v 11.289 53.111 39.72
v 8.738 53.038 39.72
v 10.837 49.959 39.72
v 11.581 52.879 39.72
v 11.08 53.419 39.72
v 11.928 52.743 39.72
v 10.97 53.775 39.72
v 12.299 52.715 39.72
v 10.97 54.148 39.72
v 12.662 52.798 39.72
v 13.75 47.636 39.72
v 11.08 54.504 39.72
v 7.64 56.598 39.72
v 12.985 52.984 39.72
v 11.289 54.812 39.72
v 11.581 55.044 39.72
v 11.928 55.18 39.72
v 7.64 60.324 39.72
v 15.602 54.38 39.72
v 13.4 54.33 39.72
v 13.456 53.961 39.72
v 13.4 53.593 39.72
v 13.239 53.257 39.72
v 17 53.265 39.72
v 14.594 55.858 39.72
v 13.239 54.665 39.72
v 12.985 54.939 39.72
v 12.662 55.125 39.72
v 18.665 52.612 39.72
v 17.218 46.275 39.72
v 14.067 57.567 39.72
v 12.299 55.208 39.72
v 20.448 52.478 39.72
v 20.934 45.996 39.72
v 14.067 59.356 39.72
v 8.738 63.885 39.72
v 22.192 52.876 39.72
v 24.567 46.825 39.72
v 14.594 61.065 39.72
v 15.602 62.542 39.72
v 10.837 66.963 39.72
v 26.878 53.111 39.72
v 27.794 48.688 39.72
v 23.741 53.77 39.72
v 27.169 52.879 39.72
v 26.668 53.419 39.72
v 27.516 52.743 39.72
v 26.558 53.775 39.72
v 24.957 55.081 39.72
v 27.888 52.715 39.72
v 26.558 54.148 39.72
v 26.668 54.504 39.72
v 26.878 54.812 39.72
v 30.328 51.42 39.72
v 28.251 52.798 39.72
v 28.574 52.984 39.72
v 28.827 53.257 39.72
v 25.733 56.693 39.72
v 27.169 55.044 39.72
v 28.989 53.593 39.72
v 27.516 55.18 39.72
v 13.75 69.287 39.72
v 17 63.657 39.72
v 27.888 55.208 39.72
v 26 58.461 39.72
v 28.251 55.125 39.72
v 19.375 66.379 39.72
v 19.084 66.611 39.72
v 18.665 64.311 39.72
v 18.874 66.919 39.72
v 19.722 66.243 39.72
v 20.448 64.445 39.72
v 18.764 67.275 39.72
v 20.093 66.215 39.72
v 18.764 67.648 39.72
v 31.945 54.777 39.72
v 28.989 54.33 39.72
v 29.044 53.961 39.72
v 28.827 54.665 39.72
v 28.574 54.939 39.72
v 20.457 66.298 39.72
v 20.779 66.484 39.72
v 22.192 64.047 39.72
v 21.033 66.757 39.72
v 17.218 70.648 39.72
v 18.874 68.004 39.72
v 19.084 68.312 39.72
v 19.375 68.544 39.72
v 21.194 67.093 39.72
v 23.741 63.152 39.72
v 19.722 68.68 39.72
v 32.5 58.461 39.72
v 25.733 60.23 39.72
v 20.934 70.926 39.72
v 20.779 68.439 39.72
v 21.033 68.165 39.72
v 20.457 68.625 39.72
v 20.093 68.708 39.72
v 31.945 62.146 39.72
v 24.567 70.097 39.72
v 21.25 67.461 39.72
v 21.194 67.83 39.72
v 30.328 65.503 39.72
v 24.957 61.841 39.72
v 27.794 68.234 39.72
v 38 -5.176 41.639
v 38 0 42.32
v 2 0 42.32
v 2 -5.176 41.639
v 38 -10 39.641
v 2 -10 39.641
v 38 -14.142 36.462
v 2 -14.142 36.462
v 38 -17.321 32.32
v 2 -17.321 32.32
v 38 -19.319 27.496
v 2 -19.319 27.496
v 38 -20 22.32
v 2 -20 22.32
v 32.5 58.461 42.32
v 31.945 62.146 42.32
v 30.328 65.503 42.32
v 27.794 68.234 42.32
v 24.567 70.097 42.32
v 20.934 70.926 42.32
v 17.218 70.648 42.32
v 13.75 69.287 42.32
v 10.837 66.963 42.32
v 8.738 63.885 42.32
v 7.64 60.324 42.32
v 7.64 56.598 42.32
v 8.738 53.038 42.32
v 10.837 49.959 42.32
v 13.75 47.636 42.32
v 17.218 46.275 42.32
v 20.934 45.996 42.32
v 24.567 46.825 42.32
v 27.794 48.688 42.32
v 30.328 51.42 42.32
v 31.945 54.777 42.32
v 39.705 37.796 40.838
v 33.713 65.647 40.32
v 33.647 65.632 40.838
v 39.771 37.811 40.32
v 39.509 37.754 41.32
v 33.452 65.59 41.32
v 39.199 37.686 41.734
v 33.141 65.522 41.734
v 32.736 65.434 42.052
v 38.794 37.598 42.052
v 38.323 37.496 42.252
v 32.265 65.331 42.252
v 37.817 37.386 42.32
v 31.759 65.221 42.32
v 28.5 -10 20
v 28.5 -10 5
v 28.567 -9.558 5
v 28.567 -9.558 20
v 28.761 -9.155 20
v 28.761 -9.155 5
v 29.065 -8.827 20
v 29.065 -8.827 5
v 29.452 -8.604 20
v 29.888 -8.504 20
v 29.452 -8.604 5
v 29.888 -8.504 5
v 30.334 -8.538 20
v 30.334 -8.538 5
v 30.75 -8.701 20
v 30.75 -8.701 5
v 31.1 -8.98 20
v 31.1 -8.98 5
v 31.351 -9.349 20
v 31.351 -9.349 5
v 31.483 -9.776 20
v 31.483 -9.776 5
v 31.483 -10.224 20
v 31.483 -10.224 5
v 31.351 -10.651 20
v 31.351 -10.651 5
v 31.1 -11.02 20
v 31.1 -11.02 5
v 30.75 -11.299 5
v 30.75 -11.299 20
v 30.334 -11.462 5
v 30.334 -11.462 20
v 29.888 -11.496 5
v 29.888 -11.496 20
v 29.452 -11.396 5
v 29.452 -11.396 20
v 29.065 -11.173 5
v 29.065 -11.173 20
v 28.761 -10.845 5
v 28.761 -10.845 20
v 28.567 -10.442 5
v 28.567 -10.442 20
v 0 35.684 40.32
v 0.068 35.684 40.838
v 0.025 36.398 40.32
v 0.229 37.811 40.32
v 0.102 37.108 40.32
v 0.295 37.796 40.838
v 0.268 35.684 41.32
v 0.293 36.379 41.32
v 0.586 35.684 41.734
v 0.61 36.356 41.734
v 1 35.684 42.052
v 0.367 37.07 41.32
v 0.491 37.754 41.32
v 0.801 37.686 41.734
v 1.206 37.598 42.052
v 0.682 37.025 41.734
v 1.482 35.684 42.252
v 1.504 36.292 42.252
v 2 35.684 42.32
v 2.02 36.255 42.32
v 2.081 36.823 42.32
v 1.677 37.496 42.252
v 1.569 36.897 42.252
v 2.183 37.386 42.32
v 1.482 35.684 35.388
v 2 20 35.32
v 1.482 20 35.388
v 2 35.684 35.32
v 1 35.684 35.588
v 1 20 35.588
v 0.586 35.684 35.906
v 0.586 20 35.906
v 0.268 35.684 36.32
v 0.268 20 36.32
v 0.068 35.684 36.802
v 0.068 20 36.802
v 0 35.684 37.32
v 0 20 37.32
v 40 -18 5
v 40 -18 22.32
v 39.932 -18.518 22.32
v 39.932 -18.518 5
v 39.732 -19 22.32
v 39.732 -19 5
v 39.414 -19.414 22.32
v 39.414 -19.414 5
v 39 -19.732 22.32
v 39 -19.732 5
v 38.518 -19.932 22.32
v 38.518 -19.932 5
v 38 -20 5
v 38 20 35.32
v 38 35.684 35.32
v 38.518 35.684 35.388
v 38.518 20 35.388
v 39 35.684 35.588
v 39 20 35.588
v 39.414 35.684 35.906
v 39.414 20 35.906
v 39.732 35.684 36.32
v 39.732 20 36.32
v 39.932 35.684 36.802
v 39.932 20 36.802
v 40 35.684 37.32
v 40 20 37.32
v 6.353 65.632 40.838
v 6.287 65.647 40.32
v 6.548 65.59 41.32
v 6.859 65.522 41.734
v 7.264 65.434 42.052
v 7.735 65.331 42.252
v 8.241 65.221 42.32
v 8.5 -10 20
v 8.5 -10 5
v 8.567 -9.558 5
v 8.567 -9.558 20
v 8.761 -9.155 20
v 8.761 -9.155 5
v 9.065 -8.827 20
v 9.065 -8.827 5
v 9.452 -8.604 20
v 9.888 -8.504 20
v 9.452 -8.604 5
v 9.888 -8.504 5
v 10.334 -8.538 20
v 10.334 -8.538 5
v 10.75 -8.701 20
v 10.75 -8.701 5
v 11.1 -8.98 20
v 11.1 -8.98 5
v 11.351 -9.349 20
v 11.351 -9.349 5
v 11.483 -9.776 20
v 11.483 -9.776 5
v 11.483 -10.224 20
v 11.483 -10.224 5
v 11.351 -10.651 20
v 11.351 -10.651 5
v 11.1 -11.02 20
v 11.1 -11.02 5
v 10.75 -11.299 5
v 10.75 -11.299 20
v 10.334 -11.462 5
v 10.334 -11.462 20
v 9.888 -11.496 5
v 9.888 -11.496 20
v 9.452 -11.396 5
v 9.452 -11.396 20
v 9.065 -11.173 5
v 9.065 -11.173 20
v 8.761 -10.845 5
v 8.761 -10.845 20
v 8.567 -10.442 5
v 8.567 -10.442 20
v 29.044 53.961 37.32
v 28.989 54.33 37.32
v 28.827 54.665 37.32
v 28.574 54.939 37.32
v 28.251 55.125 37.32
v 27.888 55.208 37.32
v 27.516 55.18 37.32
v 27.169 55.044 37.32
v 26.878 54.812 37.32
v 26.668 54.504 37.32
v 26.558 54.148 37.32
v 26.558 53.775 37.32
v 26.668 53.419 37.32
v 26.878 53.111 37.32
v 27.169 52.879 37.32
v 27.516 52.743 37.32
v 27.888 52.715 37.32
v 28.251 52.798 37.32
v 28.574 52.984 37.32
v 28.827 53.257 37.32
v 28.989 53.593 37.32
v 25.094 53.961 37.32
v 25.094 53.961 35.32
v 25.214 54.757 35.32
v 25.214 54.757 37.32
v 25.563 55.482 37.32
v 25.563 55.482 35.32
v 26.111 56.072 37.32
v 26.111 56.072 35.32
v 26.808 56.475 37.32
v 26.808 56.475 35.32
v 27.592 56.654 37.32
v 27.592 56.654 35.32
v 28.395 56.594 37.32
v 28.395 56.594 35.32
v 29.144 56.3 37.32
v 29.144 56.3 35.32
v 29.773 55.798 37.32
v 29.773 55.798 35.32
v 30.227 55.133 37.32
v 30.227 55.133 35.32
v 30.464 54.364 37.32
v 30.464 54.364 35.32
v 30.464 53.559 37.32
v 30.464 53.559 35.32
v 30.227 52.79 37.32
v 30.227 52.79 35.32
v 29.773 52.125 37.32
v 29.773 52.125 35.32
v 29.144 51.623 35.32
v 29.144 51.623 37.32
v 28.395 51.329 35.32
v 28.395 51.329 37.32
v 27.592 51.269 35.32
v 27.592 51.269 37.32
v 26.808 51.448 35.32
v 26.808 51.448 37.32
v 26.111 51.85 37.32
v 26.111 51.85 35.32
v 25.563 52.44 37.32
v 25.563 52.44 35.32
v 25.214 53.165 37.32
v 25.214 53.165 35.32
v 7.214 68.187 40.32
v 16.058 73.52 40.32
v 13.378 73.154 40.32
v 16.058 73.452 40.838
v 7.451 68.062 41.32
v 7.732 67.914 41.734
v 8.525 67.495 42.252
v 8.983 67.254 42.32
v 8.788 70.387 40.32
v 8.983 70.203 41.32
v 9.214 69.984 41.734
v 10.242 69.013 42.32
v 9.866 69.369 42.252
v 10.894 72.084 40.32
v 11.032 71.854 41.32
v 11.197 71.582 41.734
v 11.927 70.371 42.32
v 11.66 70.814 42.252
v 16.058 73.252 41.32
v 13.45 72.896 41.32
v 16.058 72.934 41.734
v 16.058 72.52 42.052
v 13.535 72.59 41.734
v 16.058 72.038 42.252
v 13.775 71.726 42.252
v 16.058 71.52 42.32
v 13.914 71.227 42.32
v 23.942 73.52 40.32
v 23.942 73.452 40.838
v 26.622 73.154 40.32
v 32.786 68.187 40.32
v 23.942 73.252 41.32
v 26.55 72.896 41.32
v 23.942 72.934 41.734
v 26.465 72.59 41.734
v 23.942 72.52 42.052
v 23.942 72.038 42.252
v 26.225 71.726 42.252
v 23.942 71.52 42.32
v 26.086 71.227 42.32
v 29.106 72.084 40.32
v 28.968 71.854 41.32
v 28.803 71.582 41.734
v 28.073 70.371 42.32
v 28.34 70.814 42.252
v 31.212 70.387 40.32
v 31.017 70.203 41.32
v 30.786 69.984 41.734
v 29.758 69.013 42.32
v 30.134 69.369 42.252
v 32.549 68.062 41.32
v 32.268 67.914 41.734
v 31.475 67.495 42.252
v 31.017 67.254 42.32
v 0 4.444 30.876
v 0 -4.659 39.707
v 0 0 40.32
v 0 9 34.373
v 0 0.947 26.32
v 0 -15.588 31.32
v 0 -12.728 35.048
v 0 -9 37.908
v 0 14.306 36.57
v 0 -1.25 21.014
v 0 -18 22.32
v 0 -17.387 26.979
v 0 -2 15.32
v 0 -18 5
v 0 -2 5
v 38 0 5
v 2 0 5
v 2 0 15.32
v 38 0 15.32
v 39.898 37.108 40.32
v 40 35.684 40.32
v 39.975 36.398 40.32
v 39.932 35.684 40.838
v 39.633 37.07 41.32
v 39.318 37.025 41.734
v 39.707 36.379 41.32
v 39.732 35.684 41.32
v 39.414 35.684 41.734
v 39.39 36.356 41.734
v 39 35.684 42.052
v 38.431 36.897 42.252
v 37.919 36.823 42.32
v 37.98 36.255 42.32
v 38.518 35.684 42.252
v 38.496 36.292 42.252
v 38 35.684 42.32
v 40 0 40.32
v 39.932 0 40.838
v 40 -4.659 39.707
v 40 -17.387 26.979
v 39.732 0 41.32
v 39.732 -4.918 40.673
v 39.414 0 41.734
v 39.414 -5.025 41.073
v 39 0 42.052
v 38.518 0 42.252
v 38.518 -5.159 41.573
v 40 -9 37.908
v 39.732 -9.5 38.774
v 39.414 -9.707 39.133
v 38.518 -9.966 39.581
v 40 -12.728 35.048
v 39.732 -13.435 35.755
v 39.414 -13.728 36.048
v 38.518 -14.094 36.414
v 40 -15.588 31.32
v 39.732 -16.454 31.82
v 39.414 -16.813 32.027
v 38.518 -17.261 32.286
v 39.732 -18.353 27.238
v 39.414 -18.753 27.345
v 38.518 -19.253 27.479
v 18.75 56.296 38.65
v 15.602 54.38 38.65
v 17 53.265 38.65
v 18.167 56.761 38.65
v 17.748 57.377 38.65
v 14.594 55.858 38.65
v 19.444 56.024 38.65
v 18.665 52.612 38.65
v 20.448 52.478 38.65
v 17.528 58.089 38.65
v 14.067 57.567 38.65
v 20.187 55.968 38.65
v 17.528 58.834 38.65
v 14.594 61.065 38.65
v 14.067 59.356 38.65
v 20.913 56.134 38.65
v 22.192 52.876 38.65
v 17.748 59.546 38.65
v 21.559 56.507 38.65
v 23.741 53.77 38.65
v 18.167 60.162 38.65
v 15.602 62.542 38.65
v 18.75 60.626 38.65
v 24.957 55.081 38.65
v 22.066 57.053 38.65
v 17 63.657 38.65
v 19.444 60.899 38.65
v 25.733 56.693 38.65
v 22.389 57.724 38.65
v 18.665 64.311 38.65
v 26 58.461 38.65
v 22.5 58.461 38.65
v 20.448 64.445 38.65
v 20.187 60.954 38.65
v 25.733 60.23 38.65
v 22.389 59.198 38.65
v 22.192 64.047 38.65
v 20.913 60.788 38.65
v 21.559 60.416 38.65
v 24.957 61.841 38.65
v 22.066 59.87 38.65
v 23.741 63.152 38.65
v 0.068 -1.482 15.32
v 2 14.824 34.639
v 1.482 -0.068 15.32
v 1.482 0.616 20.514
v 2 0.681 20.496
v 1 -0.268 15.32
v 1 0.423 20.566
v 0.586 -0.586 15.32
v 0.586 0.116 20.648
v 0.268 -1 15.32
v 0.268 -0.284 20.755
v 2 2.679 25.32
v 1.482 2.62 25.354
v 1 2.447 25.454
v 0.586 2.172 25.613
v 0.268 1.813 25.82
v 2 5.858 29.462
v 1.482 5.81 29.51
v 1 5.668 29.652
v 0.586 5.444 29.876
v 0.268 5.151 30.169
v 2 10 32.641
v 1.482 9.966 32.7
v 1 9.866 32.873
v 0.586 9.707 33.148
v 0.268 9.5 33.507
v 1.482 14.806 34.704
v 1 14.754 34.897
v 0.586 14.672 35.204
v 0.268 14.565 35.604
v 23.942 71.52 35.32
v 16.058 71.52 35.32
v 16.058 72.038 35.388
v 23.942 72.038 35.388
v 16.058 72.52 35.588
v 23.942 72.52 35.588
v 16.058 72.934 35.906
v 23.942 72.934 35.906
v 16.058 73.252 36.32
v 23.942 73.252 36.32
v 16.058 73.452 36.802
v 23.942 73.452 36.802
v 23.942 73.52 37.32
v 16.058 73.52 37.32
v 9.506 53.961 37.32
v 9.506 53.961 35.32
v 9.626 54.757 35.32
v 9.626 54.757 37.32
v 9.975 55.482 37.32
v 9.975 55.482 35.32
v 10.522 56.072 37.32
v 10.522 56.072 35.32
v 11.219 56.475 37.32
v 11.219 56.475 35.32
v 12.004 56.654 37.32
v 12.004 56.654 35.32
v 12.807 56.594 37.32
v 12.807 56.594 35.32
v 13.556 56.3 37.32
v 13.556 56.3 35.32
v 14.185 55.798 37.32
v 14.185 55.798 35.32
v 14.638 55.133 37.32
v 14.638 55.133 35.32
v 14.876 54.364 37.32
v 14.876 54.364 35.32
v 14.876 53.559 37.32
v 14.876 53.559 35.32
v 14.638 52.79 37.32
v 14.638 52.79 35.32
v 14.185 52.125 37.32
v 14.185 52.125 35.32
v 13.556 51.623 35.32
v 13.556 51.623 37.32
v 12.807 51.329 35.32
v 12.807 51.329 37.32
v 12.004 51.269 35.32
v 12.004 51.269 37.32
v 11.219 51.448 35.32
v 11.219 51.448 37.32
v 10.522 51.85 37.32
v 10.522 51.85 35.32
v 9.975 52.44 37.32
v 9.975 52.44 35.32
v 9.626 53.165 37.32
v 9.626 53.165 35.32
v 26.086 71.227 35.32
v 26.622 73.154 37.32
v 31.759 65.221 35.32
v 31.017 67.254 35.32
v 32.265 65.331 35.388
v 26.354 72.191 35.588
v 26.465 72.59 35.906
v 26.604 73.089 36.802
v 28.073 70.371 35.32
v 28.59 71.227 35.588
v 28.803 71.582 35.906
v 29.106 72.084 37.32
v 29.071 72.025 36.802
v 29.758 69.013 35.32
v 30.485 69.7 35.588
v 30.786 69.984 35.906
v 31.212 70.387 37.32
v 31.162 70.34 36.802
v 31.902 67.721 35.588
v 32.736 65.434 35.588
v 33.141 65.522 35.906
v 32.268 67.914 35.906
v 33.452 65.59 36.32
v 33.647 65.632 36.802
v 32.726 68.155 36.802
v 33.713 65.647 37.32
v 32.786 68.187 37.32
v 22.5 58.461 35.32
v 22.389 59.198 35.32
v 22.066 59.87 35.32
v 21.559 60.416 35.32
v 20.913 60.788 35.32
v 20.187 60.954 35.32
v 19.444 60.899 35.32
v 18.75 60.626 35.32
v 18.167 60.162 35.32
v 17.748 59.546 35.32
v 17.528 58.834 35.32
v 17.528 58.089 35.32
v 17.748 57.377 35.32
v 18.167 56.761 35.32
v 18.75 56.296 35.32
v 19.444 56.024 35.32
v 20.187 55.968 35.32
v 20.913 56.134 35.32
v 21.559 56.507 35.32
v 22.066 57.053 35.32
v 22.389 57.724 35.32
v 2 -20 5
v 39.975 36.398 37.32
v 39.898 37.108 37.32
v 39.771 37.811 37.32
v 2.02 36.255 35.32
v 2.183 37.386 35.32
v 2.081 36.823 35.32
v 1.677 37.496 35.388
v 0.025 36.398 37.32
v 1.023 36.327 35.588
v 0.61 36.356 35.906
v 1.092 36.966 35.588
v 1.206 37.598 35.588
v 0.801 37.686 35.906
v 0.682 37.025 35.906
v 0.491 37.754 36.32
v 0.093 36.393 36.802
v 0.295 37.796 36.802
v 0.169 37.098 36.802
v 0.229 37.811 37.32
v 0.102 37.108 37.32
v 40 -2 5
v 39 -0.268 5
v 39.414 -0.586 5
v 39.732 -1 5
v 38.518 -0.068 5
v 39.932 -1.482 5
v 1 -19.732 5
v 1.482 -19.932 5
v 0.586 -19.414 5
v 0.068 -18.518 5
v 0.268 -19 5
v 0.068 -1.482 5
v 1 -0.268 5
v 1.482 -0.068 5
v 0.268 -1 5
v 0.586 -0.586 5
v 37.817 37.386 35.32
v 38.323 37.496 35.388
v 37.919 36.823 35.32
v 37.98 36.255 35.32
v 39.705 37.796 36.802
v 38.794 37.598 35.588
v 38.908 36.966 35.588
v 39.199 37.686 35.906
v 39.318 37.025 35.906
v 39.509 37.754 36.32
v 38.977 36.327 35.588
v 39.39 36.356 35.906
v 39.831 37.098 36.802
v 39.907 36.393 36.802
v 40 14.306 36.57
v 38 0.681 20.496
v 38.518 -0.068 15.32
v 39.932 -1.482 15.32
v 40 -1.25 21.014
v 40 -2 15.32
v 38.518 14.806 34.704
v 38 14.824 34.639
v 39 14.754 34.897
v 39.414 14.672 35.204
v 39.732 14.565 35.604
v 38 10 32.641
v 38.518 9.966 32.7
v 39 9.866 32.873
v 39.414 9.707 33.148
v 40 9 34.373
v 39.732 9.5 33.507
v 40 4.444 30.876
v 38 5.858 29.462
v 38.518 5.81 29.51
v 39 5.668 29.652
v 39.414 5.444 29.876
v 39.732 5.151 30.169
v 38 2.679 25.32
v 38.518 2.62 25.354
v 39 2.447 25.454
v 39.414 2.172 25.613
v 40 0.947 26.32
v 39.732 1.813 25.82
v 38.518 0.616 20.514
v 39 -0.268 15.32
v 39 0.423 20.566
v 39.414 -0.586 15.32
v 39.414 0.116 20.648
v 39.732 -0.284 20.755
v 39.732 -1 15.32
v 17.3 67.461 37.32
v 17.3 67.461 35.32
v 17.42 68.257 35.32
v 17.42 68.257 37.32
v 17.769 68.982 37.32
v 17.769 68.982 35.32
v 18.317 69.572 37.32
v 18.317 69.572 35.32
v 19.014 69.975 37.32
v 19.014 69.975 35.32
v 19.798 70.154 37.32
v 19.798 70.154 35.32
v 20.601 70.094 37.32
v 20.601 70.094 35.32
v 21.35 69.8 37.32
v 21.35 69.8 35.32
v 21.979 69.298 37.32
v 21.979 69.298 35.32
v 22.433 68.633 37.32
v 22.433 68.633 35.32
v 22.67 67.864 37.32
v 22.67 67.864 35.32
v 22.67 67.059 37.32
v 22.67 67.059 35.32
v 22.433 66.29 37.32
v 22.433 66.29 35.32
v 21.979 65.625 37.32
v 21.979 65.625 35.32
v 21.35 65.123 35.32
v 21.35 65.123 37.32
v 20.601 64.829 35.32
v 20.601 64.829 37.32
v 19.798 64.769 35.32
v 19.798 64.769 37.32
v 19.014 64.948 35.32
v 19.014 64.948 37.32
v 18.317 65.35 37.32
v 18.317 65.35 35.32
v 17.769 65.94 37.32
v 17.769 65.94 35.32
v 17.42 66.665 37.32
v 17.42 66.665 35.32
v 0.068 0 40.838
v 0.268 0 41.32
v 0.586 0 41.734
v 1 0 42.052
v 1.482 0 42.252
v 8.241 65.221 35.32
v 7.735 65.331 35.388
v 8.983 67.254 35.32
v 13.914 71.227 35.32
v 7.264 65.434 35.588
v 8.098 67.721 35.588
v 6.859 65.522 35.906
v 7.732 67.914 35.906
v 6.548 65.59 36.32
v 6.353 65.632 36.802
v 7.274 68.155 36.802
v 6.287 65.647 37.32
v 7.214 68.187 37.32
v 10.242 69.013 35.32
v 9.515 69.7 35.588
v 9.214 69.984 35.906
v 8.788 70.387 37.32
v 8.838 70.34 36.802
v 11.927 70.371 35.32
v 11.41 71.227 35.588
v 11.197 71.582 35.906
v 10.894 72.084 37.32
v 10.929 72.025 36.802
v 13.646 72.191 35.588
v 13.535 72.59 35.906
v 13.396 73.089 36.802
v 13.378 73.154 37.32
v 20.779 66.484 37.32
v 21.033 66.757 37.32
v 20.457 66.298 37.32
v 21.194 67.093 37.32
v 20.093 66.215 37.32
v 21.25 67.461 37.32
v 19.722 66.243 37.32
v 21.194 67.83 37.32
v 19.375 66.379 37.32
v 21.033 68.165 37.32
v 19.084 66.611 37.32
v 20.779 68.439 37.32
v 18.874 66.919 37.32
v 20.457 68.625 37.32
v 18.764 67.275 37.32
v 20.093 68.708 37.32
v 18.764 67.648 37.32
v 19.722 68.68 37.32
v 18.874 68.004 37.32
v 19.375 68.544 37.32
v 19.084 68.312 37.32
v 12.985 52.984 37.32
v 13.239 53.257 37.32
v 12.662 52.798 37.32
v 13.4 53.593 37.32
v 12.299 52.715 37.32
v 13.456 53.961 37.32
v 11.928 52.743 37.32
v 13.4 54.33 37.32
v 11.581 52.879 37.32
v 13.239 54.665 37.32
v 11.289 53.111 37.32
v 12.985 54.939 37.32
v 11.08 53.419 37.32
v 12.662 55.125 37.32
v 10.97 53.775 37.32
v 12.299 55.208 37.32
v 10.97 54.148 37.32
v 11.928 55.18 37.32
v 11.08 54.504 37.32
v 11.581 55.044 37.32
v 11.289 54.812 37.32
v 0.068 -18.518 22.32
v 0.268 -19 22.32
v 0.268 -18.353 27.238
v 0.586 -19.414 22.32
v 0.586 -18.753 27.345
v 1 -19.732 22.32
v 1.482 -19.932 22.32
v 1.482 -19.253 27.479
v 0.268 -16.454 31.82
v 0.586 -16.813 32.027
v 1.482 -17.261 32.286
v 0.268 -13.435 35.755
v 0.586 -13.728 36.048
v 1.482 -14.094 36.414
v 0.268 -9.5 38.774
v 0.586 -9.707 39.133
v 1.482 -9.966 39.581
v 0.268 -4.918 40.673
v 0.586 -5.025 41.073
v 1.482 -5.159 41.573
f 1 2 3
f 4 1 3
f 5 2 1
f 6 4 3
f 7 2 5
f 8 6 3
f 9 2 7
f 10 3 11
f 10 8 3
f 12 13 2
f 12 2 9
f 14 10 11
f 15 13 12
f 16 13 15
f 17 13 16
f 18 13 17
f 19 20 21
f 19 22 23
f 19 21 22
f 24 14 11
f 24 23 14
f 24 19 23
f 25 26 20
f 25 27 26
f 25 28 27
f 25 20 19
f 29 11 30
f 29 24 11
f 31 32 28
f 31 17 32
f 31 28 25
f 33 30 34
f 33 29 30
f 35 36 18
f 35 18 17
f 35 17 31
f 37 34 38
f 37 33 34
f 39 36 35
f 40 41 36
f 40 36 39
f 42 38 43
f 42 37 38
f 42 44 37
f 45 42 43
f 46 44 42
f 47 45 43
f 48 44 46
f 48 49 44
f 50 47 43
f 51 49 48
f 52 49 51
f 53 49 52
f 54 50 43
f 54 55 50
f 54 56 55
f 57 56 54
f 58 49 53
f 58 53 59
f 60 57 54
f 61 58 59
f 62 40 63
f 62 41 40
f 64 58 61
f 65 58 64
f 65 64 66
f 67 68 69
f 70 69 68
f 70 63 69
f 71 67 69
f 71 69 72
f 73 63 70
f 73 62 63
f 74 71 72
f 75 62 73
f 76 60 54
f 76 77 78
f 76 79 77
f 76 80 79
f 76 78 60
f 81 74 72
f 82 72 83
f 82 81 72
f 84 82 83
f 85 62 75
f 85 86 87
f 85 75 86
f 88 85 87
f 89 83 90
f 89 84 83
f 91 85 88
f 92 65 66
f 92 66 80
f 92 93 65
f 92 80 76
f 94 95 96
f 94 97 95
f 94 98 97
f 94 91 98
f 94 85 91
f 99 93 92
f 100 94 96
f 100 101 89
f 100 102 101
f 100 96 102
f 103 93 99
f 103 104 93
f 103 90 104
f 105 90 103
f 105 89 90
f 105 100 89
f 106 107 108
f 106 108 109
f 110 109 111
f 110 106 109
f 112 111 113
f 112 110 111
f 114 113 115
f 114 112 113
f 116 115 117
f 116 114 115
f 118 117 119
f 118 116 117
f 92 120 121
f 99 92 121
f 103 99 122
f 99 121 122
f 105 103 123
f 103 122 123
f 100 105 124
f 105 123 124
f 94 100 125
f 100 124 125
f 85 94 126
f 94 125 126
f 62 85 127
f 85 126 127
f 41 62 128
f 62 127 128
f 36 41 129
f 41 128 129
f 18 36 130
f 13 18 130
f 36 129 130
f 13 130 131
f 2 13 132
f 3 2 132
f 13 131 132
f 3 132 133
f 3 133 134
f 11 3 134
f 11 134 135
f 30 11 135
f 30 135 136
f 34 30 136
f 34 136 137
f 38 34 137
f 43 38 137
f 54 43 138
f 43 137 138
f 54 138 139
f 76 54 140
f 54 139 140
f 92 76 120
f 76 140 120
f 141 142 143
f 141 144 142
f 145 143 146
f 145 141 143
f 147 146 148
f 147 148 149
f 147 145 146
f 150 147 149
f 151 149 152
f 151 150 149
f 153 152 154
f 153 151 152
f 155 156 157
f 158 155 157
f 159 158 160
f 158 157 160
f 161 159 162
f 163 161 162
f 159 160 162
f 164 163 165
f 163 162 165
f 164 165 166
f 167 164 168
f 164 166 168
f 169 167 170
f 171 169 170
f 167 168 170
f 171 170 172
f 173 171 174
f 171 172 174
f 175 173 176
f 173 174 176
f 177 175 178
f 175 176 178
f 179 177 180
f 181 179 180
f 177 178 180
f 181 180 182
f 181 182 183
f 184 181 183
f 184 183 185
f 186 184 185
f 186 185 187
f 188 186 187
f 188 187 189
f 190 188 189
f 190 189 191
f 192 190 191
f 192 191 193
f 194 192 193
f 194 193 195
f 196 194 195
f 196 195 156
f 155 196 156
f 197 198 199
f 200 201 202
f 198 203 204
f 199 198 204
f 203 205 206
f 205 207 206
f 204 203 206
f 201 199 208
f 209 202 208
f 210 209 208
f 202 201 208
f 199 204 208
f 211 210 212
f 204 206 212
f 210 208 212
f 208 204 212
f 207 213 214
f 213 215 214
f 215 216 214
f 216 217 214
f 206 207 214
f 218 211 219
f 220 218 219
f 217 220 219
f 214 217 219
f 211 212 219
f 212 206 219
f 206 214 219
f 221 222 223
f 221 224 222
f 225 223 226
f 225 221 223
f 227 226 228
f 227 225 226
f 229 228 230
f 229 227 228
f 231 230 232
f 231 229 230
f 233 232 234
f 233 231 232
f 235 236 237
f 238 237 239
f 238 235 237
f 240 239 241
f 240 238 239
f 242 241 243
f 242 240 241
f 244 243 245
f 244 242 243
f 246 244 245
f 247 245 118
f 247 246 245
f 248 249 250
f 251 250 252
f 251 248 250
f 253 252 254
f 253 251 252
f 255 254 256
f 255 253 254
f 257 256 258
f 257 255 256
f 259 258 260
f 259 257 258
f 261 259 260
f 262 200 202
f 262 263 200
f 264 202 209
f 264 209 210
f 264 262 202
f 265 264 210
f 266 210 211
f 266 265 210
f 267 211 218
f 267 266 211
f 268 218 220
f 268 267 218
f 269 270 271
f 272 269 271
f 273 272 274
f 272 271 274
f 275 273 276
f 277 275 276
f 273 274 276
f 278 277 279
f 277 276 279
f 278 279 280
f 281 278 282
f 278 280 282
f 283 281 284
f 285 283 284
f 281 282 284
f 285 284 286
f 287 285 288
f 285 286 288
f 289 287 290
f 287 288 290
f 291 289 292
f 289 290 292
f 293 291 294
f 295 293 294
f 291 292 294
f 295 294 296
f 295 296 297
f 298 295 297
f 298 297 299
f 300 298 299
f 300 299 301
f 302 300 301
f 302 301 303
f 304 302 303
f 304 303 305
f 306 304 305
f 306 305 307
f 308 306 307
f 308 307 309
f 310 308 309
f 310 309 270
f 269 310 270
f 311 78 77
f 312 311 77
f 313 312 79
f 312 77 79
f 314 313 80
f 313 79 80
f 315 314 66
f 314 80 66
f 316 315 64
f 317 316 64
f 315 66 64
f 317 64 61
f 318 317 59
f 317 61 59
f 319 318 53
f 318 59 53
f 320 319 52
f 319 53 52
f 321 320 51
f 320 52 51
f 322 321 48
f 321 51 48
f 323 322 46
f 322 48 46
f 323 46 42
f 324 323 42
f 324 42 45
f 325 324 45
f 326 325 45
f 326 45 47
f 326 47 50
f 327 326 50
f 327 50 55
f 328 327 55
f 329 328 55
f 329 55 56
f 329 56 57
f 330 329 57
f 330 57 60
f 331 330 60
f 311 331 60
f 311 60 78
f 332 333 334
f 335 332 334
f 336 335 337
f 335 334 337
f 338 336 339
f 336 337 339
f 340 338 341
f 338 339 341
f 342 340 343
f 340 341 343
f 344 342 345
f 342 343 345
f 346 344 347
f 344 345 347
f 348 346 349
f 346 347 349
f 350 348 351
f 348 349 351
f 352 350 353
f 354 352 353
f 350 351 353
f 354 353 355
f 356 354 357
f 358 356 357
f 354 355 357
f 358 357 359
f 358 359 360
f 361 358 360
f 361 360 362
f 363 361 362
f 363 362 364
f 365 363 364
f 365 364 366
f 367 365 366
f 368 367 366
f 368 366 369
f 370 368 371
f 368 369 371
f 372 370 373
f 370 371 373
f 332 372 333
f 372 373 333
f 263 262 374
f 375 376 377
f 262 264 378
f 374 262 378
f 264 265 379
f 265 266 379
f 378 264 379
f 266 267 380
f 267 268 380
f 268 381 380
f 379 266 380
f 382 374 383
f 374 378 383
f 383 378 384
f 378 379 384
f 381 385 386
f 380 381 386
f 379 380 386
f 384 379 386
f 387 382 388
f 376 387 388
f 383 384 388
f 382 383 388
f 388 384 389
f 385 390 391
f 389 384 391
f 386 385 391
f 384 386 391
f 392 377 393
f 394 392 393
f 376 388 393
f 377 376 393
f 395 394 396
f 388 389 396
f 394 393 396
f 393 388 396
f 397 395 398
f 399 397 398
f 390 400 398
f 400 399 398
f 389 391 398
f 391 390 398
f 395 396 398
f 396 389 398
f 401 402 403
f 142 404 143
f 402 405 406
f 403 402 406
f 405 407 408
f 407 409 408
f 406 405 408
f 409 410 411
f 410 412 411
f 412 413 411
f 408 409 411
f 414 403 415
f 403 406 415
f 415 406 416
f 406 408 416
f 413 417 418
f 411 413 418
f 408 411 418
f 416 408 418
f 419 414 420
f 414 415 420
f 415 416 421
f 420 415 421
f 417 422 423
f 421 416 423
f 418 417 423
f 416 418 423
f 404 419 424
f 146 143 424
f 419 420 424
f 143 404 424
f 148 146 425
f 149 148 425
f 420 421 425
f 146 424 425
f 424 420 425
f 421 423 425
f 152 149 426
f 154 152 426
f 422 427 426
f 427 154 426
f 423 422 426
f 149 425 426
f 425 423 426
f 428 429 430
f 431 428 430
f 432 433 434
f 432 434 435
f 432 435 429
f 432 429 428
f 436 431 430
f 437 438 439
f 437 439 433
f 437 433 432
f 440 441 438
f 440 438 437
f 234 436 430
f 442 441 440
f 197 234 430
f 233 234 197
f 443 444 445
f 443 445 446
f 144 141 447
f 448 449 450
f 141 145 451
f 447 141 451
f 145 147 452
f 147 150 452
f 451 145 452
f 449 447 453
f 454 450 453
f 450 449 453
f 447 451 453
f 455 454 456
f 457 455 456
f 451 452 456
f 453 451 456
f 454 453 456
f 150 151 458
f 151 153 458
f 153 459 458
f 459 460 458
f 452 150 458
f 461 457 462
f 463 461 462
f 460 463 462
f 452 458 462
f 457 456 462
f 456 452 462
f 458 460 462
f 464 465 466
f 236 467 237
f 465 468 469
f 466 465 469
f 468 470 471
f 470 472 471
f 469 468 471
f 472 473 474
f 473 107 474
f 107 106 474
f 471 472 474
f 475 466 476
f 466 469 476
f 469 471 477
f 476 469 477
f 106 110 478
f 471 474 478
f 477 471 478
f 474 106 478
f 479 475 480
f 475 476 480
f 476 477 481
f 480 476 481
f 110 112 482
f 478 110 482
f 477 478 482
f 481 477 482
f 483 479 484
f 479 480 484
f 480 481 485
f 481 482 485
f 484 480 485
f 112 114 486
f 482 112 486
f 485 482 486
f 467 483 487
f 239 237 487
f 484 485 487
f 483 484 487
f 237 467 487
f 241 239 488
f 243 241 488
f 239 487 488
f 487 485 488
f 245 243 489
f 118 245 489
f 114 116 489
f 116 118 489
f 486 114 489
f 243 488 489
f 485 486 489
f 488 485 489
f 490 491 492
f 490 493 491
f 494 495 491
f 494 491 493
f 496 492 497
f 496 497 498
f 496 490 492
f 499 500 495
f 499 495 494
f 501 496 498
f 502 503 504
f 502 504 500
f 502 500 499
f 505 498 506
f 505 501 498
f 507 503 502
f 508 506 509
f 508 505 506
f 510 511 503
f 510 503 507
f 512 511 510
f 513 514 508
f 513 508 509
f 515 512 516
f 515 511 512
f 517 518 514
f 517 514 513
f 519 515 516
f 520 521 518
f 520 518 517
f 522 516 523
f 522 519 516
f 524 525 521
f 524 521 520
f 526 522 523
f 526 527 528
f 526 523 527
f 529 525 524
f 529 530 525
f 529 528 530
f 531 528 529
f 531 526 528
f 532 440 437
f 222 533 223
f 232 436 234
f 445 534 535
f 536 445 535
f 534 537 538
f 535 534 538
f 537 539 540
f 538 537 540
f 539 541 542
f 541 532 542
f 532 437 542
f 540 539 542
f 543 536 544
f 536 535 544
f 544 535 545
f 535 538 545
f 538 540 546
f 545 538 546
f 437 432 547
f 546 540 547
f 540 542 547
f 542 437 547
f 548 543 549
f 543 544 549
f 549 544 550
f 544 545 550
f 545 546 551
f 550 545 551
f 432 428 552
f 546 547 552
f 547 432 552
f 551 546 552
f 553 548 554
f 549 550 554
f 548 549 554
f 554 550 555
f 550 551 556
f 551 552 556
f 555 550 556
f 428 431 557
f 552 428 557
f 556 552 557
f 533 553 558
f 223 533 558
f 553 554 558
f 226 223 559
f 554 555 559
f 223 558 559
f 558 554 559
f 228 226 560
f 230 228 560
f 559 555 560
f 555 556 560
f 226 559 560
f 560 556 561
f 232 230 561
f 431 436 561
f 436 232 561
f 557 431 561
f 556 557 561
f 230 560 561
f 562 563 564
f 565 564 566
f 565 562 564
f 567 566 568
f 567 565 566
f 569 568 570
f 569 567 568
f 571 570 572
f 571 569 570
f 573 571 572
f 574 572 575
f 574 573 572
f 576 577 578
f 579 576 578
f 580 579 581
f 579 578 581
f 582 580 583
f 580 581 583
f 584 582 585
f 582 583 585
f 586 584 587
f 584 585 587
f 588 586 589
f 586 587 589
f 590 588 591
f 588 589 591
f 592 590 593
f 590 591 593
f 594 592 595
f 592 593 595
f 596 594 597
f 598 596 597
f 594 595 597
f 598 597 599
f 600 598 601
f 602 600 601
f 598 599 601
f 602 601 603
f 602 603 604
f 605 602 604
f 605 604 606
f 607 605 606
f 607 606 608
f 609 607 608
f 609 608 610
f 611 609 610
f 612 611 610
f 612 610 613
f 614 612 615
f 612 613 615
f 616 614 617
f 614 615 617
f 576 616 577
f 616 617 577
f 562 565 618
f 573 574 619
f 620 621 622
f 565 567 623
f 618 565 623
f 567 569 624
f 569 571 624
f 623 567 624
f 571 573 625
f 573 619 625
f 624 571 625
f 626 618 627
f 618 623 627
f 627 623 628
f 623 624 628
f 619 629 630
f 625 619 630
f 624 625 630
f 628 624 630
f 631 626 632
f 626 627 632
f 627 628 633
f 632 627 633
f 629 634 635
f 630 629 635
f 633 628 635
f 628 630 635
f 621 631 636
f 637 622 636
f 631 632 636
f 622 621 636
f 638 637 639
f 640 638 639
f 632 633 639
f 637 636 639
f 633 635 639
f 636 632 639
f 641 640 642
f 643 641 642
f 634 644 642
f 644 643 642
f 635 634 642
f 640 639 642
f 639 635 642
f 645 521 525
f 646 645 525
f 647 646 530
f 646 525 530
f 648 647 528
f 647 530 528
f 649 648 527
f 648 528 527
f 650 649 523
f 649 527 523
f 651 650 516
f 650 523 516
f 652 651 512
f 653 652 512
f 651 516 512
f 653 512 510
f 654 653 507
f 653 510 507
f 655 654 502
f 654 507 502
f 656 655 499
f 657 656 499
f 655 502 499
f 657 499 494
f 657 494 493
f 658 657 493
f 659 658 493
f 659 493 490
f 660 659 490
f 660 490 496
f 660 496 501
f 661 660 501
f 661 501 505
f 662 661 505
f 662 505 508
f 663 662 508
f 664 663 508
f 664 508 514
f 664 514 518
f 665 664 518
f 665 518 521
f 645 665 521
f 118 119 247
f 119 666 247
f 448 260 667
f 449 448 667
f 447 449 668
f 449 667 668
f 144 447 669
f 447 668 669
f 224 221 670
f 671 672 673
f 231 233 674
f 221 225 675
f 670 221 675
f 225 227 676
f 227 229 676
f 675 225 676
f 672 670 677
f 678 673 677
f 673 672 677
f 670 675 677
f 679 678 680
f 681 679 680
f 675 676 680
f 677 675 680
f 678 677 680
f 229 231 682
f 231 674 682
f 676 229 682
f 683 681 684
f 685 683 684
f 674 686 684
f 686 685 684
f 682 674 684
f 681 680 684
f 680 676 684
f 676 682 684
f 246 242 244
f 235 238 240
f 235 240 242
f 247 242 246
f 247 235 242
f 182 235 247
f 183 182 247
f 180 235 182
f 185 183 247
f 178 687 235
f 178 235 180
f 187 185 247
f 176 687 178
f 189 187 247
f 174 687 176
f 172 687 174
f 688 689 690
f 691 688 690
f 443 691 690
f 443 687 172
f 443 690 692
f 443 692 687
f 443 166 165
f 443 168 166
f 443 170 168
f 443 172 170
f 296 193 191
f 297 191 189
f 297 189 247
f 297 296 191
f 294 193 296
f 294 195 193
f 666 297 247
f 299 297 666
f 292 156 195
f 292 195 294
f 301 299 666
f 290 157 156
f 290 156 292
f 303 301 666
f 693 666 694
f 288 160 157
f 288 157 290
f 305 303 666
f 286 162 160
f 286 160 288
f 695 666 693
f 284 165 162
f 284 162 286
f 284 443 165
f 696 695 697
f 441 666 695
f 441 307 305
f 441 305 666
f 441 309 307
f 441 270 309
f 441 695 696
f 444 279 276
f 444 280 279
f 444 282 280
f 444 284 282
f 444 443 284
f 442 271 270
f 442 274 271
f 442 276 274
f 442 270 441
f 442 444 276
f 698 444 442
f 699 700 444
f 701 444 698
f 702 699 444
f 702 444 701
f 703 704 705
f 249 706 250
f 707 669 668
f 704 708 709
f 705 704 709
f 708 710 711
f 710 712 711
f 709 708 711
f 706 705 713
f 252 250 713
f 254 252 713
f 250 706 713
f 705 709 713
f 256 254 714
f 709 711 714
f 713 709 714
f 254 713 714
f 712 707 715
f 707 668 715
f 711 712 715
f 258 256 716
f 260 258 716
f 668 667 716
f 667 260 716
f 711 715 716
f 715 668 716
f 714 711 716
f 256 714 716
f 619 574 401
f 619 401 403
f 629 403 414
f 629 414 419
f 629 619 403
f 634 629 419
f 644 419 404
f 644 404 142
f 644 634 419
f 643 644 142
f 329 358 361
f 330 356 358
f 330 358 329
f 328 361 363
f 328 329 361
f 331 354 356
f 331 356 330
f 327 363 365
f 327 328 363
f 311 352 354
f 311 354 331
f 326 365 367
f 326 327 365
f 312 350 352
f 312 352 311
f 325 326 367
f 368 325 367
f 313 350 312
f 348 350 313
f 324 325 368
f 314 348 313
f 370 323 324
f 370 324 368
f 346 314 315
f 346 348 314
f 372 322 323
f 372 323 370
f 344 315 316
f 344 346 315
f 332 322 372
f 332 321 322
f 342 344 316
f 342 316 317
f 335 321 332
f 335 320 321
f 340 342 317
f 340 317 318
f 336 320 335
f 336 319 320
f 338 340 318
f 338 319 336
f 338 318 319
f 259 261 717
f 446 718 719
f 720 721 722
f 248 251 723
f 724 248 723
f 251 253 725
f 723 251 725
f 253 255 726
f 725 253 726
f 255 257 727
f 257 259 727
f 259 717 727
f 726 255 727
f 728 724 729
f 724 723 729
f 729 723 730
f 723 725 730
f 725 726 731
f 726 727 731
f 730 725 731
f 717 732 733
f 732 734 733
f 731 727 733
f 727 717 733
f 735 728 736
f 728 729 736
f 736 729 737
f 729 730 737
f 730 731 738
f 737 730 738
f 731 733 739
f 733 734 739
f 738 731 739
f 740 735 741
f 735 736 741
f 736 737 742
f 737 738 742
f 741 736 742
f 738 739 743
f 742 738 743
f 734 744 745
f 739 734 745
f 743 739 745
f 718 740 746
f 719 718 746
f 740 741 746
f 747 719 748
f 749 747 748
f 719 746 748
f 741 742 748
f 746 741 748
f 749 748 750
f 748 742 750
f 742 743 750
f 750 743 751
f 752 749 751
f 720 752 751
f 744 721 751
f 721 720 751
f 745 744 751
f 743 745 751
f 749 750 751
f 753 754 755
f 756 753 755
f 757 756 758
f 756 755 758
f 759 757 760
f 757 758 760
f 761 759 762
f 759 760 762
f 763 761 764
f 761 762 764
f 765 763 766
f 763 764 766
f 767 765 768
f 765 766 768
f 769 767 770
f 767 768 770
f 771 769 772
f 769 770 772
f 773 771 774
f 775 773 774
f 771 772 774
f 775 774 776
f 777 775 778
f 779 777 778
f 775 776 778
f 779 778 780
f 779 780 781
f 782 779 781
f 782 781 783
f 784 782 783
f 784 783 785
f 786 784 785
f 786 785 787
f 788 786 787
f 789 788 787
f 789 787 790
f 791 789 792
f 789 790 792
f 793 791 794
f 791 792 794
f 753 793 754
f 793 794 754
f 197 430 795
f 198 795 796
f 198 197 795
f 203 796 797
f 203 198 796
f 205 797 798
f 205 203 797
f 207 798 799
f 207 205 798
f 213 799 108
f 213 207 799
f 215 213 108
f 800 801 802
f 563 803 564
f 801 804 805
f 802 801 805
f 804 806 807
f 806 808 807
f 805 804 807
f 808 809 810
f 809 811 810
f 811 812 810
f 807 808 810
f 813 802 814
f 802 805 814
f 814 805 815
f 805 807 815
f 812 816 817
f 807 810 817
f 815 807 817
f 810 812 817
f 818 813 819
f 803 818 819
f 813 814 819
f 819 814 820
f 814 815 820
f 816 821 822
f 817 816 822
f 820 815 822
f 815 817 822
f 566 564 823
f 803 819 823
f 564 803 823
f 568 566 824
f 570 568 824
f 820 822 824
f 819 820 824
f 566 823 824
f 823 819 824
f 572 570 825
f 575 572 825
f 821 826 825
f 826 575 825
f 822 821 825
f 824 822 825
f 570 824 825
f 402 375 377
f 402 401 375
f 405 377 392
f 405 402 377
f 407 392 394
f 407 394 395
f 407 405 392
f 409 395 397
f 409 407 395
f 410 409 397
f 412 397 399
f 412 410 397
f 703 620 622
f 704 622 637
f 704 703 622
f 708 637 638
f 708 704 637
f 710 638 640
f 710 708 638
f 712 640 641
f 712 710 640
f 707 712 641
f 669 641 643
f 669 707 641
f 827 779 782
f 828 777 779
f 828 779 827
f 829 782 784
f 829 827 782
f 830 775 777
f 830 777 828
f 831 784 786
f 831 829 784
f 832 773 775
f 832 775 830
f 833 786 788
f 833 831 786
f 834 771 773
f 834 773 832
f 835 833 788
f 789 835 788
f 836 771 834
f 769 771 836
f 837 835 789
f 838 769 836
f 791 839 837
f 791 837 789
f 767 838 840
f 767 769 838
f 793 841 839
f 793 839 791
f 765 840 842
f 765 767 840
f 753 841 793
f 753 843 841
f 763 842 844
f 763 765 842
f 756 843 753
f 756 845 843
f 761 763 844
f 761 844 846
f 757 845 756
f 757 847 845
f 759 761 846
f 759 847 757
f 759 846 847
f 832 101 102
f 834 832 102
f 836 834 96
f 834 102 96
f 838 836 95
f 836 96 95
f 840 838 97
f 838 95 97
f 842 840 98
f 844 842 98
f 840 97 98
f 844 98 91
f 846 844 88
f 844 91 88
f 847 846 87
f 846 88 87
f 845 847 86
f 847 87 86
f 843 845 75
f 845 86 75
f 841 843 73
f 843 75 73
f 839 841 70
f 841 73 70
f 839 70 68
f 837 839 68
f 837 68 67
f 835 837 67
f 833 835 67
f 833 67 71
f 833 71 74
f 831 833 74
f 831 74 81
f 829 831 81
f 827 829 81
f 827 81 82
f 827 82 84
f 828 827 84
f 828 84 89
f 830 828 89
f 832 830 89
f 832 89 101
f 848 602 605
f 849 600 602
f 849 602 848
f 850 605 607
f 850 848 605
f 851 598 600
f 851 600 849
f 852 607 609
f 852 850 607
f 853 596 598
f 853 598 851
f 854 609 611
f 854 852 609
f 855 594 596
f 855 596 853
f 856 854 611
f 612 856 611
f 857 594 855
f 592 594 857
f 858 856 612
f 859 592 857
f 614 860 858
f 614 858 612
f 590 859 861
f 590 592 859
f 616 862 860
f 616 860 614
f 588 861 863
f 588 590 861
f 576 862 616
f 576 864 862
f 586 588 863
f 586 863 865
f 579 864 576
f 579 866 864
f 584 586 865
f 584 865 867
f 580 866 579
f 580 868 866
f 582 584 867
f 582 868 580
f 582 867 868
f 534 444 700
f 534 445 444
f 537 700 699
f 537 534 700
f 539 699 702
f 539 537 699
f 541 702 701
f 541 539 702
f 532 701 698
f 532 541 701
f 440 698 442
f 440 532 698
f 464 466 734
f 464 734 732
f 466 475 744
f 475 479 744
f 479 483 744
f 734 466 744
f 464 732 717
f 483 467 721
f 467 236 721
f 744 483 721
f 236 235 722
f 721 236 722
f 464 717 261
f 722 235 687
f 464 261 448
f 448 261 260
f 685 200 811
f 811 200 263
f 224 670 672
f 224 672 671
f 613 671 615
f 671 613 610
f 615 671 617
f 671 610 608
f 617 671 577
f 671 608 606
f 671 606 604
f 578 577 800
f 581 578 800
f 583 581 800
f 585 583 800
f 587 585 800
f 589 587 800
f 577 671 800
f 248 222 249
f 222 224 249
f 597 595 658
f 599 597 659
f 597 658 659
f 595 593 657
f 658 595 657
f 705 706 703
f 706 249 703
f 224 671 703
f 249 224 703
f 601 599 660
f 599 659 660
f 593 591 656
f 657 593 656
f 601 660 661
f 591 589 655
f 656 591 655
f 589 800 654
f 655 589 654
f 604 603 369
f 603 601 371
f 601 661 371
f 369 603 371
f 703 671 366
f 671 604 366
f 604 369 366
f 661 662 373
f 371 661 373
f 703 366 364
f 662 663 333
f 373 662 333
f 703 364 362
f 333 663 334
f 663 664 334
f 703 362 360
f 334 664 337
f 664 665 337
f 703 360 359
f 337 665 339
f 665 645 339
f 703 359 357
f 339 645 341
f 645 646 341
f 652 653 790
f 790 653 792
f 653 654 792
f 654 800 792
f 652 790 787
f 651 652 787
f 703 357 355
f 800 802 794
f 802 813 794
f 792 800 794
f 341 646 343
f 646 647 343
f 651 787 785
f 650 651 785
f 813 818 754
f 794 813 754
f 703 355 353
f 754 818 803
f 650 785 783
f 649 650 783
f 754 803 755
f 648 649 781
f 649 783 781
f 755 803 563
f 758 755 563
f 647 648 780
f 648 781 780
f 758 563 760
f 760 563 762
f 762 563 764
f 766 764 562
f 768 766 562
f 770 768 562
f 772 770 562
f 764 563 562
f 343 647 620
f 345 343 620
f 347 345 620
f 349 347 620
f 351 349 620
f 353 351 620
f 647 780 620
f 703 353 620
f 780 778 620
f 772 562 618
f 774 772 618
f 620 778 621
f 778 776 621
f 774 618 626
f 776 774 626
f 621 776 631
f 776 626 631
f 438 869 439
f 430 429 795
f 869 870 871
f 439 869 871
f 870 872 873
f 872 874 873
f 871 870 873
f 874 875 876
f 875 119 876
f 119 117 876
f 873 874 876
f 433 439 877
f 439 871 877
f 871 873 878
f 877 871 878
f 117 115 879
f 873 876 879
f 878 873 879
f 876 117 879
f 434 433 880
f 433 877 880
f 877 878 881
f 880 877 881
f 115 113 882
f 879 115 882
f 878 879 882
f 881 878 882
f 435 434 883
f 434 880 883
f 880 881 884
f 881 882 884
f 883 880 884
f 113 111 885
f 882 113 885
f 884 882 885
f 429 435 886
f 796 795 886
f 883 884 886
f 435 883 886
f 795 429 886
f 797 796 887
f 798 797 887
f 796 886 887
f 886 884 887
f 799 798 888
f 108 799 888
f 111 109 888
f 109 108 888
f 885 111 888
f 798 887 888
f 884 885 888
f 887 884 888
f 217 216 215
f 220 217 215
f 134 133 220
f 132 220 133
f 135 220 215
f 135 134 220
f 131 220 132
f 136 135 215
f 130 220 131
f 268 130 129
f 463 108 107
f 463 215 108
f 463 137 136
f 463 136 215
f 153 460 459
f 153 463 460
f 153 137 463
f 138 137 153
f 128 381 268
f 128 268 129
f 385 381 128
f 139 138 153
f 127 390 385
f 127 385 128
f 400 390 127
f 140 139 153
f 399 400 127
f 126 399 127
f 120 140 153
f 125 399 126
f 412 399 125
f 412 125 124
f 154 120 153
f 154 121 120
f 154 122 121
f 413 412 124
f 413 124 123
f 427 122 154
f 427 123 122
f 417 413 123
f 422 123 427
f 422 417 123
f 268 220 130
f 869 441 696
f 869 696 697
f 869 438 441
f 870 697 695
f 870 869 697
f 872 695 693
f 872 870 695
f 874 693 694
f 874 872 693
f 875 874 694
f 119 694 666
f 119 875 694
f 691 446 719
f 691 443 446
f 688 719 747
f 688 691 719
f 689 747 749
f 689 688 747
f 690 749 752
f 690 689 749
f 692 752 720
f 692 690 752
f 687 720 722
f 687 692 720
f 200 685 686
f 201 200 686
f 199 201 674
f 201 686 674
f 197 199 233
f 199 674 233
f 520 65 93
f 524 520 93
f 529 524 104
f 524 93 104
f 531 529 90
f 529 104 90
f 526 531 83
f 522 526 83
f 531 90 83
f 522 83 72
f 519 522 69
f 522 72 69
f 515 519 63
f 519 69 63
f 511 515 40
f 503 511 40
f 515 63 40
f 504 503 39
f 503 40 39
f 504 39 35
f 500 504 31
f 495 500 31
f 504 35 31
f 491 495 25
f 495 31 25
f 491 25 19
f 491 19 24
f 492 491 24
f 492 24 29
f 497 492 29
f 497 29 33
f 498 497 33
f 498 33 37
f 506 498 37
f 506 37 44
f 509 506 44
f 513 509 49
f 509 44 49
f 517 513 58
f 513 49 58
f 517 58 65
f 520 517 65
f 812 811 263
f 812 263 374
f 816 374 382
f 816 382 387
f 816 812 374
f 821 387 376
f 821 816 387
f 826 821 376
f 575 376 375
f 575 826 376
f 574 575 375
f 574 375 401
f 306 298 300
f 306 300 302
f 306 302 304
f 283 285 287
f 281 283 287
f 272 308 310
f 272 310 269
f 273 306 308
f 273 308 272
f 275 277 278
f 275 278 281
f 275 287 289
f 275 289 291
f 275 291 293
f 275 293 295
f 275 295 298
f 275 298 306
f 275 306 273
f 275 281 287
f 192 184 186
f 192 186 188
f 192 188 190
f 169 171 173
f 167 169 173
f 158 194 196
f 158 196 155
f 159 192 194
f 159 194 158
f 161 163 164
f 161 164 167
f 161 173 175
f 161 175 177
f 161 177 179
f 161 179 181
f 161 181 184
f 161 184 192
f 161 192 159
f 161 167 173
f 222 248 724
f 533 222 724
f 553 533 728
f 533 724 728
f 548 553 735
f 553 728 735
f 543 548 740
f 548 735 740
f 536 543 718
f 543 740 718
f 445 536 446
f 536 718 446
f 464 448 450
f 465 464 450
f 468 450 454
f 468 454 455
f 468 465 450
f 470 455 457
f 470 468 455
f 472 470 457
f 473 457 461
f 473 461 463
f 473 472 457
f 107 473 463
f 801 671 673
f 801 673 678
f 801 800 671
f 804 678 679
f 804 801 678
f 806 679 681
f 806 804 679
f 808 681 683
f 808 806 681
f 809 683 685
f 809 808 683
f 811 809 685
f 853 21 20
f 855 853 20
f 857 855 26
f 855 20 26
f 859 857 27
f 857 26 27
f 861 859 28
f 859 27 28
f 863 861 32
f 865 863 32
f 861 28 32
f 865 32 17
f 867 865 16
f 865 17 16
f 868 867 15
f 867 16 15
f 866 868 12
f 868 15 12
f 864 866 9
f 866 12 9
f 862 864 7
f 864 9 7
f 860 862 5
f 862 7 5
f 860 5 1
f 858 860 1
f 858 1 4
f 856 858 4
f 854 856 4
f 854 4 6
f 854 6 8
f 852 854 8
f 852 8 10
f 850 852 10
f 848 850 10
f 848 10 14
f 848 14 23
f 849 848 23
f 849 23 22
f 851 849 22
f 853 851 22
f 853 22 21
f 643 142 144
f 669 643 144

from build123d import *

# Parameters (mm, degrees)
SKETCH1_W           = 40
SKETCH1_H           = 20
BOSS_EXTRUDE4_DEPTH = 35.32
SKETCH3_W           = 40
SKETCH3_H           = 93.52
BOSS_EXTRUDE5_DEPTH = 7
SKETCH4_R           = 12.5
CUT_EXTRUDE1_DEPTH  = 2.6
SKETCH5_R           = 6
CUT_EXTRUDE2_DEPTH  = 1.07
SKETCH6_R           = 2.5
CUT_EXTRUDE3_DEPTH  = 4
SKETCH7_R           = 1.25
CUT_EXTRUDE5_DEPTH  = 6
SKETCH9_R           = 2.7
CUT_EXTRUDE6_DEPTH  = 2
SKETCH10_R          = 1.5
CUT_EXTRUDE8_DEPTH  = 20
FILLET1_R           = 20
FILLET2_R           = 20
SKETCH11_W          = 45.672001295
SKETCH11_H          = 21.162412363
CUT_EXTRUDE9_DEPTH  = 5
CUT_EXTRUDE10_DEPTH = 10
FILLET5_R           = 10
FILLET6_R           = 10
FILLET7_R           = 10
FILLET8_R           = 10
FILLET9_R           = 2
FILLET10_R          = 2


with BuildPart() as part:
    # Sketch1 → Boss-Extrude4 (new body)
    with BuildSketch(Plane.XY):
        with Locations((20, -10)):
            Rectangle(SKETCH1_W, SKETCH1_H)
    extrude(amount=BOSS_EXTRUDE4_DEPTH)

    # Sketch3 → Boss-Extrude5 (add)
    with BuildSketch(Plane.XY.offset(35.32)):
        with Locations((20, 26.76)):
            Rectangle(SKETCH3_W, SKETCH3_H)
    extrude(amount=BOSS_EXTRUDE5_DEPTH)

    # Sketch4 → Cut-Extrude1 (cut)
    with BuildSketch(Plane.XY.offset(42.32)):
        with Locations((20, 58.46128741)):
            Circle(SKETCH4_R)
    extrude(amount=-CUT_EXTRUDE1_DEPTH, mode=Mode.SUBTRACT)

    # Sketch5 → Cut-Extrude2 (cut)
    with BuildSketch(Plane.XY.offset(39.72)):
        with Locations((20, 58.46128741)):
            Circle(SKETCH5_R)
    extrude(amount=-CUT_EXTRUDE2_DEPTH, mode=Mode.SUBTRACT)

    # Sketch6 → Cut-Extrude3 (cut)
    with BuildSketch(Plane.XY.offset(38.65)):
        with Locations((20, 58.46128741)):
            Circle(SKETCH6_R)
    extrude(amount=-CUT_EXTRUDE3_DEPTH, mode=Mode.SUBTRACT)

    # Sketch7 → Cut-Extrude5 (cut)
    with BuildSketch(Plane.XY.offset(39.72)):
        with Locations((27.794228634, 53.96128741)):
            Circle(SKETCH7_R)
        with Locations((12.205771366, 53.96128741)):
            Circle(SKETCH7_R)
        with Locations((20, 67.46128741)):
            Circle(SKETCH7_R)
    extrude(amount=-CUT_EXTRUDE5_DEPTH, mode=Mode.SUBTRACT)

    # Sketch9 → Cut-Extrude6 (cut)
    with BuildSketch(Plane(origin=(0, 0, 35.32), x_dir=(-1, 0, 0), z_dir=(0, 0, -1))):
        with Locations((-27.794228634, 53.96128741)):
            Circle(SKETCH9_R)
        with Locations((-12.205771366, 53.96128741)):
            Circle(SKETCH9_R)
        with Locations((-20, 67.46128741)):
            Circle(SKETCH9_R)
    extrude(amount=-CUT_EXTRUDE6_DEPTH, mode=Mode.SUBTRACT)

    # Sketch10 → Cut-Extrude8 (cut)
    with BuildSketch(Plane(origin=(0, 0, 0), x_dir=(-1, 0, 0), z_dir=(0, 0, -1))):
        with Locations((-30, -10)):
            Circle(SKETCH10_R)
        with Locations((-10, -10)):
            Circle(SKETCH10_R)
    extrude(amount=-CUT_EXTRUDE8_DEPTH, mode=Mode.SUBTRACT)

    # Fillet1
    fillet1_edges = [part.edges().sort_by_distance(p)[0] for p in [
        (20, 0, 35.32),
    ]]
    fillet(fillet1_edges, radius=FILLET1_R)

    # Fillet2
    fillet2_edges = [part.edges().sort_by_distance(p)[0] for p in [
        (20, -20, 42.32),
    ]]
    fillet(fillet2_edges, radius=FILLET2_R)

    # Sketch11 → Cut-Extrude9 (cut)
    with BuildSketch(Plane(origin=(0, 0, 0), x_dir=(-1, 0, 0), z_dir=(0, 0, -1))):
        with Locations((-18.602034722, -10.581206182)):
            Rectangle(SKETCH11_W, SKETCH11_H)
    extrude(amount=-CUT_EXTRUDE9_DEPTH, mode=Mode.SUBTRACT)

    # Sketch12 → Cut-Extrude10 (cut)
    with BuildSketch(Plane.XY.offset(42.32)):
        Polygon((0, 36.76), (8, 73.52), (0, 73.52), align=None)
        Polygon((32, 73.52), (40, 36.76), (40, 73.52), align=None)
    extrude(amount=-CUT_EXTRUDE10_DEPTH, mode=Mode.SUBTRACT)

    # Fillet5
    fillet5_edges = [part.edges().sort_by_distance(p)[0] for p in [
        (8, 73.52, 38.82),
    ]]
    fillet(fillet5_edges, radius=FILLET5_R)

    # Fillet6
    fillet6_edges = [part.edges().sort_by_distance(p)[0] for p in [
        (32, 73.52, 38.82),
    ]]
    fillet(fillet6_edges, radius=FILLET6_R)

    # Fillet7
    fillet7_edges = [part.edges().sort_by_distance(p)[0] for p in [
        (0, 36.76, 38.82),
    ]]
    fillet(fillet7_edges, radius=FILLET7_R)

    # Fillet8
    fillet8_edges = [part.edges().sort_by_distance(p)[0] for p in [
        (40, 36.76, 38.82),
    ]]
    fillet(fillet8_edges, radius=FILLET8_R)

    # Fillet9
    fillet9_edges = [part.edges().sort_by_distance(p)[0] for p in [
        (9.783440256, 71.306688481, 42.32),
        (36.742387874, 51.728727718, 42.32),
        (20, 73.52, 42.32),
        (30.216559744, 71.306688481, 42.32),
        (3.257612126, 51.728727718, 42.32),
        (0, 17.842224217, 42.32),
        (0.057343518, 36.753832409, 42.32),
        (39.942656482, 36.753832409, 42.32),
        (40, 17.842224217, 42.32),
        (40, -20, 13.66),
        (40, -14.142135624, 36.462135624),
        (0, -20, 13.66),
        (0, -14.142135624, 36.462135624),
    ]]
    fillet(fillet9_edges, radius=FILLET9_R)

    # Fillet10
    fillet10_edges = [part.edges().sort_by_distance(p)[0] for p in [
        (9.783440256, 71.306688481, 35.32),
        (36.742387874, 51.728727718, 35.32),
        (20, 73.52, 35.32),
        (30.216559744, 71.306688481, 35.32),
        (3.257612126, 51.728727718, 35.32),
        (0, 27.842224217, 35.32),
        (0.057343518, 36.753832409, 35.32),
        (39.942656482, 36.753832409, 35.32),
        (40, 27.842224217, 35.32),
        (0, 0, 10.16),
        (40, 0, 10.16),
        (0, 5.857864376, 29.462135624),
        (40, 5.857864376, 29.462135624),
    ]]
    fillet(fillet10_edges, radius=FILLET10_R)


solid = part.part
